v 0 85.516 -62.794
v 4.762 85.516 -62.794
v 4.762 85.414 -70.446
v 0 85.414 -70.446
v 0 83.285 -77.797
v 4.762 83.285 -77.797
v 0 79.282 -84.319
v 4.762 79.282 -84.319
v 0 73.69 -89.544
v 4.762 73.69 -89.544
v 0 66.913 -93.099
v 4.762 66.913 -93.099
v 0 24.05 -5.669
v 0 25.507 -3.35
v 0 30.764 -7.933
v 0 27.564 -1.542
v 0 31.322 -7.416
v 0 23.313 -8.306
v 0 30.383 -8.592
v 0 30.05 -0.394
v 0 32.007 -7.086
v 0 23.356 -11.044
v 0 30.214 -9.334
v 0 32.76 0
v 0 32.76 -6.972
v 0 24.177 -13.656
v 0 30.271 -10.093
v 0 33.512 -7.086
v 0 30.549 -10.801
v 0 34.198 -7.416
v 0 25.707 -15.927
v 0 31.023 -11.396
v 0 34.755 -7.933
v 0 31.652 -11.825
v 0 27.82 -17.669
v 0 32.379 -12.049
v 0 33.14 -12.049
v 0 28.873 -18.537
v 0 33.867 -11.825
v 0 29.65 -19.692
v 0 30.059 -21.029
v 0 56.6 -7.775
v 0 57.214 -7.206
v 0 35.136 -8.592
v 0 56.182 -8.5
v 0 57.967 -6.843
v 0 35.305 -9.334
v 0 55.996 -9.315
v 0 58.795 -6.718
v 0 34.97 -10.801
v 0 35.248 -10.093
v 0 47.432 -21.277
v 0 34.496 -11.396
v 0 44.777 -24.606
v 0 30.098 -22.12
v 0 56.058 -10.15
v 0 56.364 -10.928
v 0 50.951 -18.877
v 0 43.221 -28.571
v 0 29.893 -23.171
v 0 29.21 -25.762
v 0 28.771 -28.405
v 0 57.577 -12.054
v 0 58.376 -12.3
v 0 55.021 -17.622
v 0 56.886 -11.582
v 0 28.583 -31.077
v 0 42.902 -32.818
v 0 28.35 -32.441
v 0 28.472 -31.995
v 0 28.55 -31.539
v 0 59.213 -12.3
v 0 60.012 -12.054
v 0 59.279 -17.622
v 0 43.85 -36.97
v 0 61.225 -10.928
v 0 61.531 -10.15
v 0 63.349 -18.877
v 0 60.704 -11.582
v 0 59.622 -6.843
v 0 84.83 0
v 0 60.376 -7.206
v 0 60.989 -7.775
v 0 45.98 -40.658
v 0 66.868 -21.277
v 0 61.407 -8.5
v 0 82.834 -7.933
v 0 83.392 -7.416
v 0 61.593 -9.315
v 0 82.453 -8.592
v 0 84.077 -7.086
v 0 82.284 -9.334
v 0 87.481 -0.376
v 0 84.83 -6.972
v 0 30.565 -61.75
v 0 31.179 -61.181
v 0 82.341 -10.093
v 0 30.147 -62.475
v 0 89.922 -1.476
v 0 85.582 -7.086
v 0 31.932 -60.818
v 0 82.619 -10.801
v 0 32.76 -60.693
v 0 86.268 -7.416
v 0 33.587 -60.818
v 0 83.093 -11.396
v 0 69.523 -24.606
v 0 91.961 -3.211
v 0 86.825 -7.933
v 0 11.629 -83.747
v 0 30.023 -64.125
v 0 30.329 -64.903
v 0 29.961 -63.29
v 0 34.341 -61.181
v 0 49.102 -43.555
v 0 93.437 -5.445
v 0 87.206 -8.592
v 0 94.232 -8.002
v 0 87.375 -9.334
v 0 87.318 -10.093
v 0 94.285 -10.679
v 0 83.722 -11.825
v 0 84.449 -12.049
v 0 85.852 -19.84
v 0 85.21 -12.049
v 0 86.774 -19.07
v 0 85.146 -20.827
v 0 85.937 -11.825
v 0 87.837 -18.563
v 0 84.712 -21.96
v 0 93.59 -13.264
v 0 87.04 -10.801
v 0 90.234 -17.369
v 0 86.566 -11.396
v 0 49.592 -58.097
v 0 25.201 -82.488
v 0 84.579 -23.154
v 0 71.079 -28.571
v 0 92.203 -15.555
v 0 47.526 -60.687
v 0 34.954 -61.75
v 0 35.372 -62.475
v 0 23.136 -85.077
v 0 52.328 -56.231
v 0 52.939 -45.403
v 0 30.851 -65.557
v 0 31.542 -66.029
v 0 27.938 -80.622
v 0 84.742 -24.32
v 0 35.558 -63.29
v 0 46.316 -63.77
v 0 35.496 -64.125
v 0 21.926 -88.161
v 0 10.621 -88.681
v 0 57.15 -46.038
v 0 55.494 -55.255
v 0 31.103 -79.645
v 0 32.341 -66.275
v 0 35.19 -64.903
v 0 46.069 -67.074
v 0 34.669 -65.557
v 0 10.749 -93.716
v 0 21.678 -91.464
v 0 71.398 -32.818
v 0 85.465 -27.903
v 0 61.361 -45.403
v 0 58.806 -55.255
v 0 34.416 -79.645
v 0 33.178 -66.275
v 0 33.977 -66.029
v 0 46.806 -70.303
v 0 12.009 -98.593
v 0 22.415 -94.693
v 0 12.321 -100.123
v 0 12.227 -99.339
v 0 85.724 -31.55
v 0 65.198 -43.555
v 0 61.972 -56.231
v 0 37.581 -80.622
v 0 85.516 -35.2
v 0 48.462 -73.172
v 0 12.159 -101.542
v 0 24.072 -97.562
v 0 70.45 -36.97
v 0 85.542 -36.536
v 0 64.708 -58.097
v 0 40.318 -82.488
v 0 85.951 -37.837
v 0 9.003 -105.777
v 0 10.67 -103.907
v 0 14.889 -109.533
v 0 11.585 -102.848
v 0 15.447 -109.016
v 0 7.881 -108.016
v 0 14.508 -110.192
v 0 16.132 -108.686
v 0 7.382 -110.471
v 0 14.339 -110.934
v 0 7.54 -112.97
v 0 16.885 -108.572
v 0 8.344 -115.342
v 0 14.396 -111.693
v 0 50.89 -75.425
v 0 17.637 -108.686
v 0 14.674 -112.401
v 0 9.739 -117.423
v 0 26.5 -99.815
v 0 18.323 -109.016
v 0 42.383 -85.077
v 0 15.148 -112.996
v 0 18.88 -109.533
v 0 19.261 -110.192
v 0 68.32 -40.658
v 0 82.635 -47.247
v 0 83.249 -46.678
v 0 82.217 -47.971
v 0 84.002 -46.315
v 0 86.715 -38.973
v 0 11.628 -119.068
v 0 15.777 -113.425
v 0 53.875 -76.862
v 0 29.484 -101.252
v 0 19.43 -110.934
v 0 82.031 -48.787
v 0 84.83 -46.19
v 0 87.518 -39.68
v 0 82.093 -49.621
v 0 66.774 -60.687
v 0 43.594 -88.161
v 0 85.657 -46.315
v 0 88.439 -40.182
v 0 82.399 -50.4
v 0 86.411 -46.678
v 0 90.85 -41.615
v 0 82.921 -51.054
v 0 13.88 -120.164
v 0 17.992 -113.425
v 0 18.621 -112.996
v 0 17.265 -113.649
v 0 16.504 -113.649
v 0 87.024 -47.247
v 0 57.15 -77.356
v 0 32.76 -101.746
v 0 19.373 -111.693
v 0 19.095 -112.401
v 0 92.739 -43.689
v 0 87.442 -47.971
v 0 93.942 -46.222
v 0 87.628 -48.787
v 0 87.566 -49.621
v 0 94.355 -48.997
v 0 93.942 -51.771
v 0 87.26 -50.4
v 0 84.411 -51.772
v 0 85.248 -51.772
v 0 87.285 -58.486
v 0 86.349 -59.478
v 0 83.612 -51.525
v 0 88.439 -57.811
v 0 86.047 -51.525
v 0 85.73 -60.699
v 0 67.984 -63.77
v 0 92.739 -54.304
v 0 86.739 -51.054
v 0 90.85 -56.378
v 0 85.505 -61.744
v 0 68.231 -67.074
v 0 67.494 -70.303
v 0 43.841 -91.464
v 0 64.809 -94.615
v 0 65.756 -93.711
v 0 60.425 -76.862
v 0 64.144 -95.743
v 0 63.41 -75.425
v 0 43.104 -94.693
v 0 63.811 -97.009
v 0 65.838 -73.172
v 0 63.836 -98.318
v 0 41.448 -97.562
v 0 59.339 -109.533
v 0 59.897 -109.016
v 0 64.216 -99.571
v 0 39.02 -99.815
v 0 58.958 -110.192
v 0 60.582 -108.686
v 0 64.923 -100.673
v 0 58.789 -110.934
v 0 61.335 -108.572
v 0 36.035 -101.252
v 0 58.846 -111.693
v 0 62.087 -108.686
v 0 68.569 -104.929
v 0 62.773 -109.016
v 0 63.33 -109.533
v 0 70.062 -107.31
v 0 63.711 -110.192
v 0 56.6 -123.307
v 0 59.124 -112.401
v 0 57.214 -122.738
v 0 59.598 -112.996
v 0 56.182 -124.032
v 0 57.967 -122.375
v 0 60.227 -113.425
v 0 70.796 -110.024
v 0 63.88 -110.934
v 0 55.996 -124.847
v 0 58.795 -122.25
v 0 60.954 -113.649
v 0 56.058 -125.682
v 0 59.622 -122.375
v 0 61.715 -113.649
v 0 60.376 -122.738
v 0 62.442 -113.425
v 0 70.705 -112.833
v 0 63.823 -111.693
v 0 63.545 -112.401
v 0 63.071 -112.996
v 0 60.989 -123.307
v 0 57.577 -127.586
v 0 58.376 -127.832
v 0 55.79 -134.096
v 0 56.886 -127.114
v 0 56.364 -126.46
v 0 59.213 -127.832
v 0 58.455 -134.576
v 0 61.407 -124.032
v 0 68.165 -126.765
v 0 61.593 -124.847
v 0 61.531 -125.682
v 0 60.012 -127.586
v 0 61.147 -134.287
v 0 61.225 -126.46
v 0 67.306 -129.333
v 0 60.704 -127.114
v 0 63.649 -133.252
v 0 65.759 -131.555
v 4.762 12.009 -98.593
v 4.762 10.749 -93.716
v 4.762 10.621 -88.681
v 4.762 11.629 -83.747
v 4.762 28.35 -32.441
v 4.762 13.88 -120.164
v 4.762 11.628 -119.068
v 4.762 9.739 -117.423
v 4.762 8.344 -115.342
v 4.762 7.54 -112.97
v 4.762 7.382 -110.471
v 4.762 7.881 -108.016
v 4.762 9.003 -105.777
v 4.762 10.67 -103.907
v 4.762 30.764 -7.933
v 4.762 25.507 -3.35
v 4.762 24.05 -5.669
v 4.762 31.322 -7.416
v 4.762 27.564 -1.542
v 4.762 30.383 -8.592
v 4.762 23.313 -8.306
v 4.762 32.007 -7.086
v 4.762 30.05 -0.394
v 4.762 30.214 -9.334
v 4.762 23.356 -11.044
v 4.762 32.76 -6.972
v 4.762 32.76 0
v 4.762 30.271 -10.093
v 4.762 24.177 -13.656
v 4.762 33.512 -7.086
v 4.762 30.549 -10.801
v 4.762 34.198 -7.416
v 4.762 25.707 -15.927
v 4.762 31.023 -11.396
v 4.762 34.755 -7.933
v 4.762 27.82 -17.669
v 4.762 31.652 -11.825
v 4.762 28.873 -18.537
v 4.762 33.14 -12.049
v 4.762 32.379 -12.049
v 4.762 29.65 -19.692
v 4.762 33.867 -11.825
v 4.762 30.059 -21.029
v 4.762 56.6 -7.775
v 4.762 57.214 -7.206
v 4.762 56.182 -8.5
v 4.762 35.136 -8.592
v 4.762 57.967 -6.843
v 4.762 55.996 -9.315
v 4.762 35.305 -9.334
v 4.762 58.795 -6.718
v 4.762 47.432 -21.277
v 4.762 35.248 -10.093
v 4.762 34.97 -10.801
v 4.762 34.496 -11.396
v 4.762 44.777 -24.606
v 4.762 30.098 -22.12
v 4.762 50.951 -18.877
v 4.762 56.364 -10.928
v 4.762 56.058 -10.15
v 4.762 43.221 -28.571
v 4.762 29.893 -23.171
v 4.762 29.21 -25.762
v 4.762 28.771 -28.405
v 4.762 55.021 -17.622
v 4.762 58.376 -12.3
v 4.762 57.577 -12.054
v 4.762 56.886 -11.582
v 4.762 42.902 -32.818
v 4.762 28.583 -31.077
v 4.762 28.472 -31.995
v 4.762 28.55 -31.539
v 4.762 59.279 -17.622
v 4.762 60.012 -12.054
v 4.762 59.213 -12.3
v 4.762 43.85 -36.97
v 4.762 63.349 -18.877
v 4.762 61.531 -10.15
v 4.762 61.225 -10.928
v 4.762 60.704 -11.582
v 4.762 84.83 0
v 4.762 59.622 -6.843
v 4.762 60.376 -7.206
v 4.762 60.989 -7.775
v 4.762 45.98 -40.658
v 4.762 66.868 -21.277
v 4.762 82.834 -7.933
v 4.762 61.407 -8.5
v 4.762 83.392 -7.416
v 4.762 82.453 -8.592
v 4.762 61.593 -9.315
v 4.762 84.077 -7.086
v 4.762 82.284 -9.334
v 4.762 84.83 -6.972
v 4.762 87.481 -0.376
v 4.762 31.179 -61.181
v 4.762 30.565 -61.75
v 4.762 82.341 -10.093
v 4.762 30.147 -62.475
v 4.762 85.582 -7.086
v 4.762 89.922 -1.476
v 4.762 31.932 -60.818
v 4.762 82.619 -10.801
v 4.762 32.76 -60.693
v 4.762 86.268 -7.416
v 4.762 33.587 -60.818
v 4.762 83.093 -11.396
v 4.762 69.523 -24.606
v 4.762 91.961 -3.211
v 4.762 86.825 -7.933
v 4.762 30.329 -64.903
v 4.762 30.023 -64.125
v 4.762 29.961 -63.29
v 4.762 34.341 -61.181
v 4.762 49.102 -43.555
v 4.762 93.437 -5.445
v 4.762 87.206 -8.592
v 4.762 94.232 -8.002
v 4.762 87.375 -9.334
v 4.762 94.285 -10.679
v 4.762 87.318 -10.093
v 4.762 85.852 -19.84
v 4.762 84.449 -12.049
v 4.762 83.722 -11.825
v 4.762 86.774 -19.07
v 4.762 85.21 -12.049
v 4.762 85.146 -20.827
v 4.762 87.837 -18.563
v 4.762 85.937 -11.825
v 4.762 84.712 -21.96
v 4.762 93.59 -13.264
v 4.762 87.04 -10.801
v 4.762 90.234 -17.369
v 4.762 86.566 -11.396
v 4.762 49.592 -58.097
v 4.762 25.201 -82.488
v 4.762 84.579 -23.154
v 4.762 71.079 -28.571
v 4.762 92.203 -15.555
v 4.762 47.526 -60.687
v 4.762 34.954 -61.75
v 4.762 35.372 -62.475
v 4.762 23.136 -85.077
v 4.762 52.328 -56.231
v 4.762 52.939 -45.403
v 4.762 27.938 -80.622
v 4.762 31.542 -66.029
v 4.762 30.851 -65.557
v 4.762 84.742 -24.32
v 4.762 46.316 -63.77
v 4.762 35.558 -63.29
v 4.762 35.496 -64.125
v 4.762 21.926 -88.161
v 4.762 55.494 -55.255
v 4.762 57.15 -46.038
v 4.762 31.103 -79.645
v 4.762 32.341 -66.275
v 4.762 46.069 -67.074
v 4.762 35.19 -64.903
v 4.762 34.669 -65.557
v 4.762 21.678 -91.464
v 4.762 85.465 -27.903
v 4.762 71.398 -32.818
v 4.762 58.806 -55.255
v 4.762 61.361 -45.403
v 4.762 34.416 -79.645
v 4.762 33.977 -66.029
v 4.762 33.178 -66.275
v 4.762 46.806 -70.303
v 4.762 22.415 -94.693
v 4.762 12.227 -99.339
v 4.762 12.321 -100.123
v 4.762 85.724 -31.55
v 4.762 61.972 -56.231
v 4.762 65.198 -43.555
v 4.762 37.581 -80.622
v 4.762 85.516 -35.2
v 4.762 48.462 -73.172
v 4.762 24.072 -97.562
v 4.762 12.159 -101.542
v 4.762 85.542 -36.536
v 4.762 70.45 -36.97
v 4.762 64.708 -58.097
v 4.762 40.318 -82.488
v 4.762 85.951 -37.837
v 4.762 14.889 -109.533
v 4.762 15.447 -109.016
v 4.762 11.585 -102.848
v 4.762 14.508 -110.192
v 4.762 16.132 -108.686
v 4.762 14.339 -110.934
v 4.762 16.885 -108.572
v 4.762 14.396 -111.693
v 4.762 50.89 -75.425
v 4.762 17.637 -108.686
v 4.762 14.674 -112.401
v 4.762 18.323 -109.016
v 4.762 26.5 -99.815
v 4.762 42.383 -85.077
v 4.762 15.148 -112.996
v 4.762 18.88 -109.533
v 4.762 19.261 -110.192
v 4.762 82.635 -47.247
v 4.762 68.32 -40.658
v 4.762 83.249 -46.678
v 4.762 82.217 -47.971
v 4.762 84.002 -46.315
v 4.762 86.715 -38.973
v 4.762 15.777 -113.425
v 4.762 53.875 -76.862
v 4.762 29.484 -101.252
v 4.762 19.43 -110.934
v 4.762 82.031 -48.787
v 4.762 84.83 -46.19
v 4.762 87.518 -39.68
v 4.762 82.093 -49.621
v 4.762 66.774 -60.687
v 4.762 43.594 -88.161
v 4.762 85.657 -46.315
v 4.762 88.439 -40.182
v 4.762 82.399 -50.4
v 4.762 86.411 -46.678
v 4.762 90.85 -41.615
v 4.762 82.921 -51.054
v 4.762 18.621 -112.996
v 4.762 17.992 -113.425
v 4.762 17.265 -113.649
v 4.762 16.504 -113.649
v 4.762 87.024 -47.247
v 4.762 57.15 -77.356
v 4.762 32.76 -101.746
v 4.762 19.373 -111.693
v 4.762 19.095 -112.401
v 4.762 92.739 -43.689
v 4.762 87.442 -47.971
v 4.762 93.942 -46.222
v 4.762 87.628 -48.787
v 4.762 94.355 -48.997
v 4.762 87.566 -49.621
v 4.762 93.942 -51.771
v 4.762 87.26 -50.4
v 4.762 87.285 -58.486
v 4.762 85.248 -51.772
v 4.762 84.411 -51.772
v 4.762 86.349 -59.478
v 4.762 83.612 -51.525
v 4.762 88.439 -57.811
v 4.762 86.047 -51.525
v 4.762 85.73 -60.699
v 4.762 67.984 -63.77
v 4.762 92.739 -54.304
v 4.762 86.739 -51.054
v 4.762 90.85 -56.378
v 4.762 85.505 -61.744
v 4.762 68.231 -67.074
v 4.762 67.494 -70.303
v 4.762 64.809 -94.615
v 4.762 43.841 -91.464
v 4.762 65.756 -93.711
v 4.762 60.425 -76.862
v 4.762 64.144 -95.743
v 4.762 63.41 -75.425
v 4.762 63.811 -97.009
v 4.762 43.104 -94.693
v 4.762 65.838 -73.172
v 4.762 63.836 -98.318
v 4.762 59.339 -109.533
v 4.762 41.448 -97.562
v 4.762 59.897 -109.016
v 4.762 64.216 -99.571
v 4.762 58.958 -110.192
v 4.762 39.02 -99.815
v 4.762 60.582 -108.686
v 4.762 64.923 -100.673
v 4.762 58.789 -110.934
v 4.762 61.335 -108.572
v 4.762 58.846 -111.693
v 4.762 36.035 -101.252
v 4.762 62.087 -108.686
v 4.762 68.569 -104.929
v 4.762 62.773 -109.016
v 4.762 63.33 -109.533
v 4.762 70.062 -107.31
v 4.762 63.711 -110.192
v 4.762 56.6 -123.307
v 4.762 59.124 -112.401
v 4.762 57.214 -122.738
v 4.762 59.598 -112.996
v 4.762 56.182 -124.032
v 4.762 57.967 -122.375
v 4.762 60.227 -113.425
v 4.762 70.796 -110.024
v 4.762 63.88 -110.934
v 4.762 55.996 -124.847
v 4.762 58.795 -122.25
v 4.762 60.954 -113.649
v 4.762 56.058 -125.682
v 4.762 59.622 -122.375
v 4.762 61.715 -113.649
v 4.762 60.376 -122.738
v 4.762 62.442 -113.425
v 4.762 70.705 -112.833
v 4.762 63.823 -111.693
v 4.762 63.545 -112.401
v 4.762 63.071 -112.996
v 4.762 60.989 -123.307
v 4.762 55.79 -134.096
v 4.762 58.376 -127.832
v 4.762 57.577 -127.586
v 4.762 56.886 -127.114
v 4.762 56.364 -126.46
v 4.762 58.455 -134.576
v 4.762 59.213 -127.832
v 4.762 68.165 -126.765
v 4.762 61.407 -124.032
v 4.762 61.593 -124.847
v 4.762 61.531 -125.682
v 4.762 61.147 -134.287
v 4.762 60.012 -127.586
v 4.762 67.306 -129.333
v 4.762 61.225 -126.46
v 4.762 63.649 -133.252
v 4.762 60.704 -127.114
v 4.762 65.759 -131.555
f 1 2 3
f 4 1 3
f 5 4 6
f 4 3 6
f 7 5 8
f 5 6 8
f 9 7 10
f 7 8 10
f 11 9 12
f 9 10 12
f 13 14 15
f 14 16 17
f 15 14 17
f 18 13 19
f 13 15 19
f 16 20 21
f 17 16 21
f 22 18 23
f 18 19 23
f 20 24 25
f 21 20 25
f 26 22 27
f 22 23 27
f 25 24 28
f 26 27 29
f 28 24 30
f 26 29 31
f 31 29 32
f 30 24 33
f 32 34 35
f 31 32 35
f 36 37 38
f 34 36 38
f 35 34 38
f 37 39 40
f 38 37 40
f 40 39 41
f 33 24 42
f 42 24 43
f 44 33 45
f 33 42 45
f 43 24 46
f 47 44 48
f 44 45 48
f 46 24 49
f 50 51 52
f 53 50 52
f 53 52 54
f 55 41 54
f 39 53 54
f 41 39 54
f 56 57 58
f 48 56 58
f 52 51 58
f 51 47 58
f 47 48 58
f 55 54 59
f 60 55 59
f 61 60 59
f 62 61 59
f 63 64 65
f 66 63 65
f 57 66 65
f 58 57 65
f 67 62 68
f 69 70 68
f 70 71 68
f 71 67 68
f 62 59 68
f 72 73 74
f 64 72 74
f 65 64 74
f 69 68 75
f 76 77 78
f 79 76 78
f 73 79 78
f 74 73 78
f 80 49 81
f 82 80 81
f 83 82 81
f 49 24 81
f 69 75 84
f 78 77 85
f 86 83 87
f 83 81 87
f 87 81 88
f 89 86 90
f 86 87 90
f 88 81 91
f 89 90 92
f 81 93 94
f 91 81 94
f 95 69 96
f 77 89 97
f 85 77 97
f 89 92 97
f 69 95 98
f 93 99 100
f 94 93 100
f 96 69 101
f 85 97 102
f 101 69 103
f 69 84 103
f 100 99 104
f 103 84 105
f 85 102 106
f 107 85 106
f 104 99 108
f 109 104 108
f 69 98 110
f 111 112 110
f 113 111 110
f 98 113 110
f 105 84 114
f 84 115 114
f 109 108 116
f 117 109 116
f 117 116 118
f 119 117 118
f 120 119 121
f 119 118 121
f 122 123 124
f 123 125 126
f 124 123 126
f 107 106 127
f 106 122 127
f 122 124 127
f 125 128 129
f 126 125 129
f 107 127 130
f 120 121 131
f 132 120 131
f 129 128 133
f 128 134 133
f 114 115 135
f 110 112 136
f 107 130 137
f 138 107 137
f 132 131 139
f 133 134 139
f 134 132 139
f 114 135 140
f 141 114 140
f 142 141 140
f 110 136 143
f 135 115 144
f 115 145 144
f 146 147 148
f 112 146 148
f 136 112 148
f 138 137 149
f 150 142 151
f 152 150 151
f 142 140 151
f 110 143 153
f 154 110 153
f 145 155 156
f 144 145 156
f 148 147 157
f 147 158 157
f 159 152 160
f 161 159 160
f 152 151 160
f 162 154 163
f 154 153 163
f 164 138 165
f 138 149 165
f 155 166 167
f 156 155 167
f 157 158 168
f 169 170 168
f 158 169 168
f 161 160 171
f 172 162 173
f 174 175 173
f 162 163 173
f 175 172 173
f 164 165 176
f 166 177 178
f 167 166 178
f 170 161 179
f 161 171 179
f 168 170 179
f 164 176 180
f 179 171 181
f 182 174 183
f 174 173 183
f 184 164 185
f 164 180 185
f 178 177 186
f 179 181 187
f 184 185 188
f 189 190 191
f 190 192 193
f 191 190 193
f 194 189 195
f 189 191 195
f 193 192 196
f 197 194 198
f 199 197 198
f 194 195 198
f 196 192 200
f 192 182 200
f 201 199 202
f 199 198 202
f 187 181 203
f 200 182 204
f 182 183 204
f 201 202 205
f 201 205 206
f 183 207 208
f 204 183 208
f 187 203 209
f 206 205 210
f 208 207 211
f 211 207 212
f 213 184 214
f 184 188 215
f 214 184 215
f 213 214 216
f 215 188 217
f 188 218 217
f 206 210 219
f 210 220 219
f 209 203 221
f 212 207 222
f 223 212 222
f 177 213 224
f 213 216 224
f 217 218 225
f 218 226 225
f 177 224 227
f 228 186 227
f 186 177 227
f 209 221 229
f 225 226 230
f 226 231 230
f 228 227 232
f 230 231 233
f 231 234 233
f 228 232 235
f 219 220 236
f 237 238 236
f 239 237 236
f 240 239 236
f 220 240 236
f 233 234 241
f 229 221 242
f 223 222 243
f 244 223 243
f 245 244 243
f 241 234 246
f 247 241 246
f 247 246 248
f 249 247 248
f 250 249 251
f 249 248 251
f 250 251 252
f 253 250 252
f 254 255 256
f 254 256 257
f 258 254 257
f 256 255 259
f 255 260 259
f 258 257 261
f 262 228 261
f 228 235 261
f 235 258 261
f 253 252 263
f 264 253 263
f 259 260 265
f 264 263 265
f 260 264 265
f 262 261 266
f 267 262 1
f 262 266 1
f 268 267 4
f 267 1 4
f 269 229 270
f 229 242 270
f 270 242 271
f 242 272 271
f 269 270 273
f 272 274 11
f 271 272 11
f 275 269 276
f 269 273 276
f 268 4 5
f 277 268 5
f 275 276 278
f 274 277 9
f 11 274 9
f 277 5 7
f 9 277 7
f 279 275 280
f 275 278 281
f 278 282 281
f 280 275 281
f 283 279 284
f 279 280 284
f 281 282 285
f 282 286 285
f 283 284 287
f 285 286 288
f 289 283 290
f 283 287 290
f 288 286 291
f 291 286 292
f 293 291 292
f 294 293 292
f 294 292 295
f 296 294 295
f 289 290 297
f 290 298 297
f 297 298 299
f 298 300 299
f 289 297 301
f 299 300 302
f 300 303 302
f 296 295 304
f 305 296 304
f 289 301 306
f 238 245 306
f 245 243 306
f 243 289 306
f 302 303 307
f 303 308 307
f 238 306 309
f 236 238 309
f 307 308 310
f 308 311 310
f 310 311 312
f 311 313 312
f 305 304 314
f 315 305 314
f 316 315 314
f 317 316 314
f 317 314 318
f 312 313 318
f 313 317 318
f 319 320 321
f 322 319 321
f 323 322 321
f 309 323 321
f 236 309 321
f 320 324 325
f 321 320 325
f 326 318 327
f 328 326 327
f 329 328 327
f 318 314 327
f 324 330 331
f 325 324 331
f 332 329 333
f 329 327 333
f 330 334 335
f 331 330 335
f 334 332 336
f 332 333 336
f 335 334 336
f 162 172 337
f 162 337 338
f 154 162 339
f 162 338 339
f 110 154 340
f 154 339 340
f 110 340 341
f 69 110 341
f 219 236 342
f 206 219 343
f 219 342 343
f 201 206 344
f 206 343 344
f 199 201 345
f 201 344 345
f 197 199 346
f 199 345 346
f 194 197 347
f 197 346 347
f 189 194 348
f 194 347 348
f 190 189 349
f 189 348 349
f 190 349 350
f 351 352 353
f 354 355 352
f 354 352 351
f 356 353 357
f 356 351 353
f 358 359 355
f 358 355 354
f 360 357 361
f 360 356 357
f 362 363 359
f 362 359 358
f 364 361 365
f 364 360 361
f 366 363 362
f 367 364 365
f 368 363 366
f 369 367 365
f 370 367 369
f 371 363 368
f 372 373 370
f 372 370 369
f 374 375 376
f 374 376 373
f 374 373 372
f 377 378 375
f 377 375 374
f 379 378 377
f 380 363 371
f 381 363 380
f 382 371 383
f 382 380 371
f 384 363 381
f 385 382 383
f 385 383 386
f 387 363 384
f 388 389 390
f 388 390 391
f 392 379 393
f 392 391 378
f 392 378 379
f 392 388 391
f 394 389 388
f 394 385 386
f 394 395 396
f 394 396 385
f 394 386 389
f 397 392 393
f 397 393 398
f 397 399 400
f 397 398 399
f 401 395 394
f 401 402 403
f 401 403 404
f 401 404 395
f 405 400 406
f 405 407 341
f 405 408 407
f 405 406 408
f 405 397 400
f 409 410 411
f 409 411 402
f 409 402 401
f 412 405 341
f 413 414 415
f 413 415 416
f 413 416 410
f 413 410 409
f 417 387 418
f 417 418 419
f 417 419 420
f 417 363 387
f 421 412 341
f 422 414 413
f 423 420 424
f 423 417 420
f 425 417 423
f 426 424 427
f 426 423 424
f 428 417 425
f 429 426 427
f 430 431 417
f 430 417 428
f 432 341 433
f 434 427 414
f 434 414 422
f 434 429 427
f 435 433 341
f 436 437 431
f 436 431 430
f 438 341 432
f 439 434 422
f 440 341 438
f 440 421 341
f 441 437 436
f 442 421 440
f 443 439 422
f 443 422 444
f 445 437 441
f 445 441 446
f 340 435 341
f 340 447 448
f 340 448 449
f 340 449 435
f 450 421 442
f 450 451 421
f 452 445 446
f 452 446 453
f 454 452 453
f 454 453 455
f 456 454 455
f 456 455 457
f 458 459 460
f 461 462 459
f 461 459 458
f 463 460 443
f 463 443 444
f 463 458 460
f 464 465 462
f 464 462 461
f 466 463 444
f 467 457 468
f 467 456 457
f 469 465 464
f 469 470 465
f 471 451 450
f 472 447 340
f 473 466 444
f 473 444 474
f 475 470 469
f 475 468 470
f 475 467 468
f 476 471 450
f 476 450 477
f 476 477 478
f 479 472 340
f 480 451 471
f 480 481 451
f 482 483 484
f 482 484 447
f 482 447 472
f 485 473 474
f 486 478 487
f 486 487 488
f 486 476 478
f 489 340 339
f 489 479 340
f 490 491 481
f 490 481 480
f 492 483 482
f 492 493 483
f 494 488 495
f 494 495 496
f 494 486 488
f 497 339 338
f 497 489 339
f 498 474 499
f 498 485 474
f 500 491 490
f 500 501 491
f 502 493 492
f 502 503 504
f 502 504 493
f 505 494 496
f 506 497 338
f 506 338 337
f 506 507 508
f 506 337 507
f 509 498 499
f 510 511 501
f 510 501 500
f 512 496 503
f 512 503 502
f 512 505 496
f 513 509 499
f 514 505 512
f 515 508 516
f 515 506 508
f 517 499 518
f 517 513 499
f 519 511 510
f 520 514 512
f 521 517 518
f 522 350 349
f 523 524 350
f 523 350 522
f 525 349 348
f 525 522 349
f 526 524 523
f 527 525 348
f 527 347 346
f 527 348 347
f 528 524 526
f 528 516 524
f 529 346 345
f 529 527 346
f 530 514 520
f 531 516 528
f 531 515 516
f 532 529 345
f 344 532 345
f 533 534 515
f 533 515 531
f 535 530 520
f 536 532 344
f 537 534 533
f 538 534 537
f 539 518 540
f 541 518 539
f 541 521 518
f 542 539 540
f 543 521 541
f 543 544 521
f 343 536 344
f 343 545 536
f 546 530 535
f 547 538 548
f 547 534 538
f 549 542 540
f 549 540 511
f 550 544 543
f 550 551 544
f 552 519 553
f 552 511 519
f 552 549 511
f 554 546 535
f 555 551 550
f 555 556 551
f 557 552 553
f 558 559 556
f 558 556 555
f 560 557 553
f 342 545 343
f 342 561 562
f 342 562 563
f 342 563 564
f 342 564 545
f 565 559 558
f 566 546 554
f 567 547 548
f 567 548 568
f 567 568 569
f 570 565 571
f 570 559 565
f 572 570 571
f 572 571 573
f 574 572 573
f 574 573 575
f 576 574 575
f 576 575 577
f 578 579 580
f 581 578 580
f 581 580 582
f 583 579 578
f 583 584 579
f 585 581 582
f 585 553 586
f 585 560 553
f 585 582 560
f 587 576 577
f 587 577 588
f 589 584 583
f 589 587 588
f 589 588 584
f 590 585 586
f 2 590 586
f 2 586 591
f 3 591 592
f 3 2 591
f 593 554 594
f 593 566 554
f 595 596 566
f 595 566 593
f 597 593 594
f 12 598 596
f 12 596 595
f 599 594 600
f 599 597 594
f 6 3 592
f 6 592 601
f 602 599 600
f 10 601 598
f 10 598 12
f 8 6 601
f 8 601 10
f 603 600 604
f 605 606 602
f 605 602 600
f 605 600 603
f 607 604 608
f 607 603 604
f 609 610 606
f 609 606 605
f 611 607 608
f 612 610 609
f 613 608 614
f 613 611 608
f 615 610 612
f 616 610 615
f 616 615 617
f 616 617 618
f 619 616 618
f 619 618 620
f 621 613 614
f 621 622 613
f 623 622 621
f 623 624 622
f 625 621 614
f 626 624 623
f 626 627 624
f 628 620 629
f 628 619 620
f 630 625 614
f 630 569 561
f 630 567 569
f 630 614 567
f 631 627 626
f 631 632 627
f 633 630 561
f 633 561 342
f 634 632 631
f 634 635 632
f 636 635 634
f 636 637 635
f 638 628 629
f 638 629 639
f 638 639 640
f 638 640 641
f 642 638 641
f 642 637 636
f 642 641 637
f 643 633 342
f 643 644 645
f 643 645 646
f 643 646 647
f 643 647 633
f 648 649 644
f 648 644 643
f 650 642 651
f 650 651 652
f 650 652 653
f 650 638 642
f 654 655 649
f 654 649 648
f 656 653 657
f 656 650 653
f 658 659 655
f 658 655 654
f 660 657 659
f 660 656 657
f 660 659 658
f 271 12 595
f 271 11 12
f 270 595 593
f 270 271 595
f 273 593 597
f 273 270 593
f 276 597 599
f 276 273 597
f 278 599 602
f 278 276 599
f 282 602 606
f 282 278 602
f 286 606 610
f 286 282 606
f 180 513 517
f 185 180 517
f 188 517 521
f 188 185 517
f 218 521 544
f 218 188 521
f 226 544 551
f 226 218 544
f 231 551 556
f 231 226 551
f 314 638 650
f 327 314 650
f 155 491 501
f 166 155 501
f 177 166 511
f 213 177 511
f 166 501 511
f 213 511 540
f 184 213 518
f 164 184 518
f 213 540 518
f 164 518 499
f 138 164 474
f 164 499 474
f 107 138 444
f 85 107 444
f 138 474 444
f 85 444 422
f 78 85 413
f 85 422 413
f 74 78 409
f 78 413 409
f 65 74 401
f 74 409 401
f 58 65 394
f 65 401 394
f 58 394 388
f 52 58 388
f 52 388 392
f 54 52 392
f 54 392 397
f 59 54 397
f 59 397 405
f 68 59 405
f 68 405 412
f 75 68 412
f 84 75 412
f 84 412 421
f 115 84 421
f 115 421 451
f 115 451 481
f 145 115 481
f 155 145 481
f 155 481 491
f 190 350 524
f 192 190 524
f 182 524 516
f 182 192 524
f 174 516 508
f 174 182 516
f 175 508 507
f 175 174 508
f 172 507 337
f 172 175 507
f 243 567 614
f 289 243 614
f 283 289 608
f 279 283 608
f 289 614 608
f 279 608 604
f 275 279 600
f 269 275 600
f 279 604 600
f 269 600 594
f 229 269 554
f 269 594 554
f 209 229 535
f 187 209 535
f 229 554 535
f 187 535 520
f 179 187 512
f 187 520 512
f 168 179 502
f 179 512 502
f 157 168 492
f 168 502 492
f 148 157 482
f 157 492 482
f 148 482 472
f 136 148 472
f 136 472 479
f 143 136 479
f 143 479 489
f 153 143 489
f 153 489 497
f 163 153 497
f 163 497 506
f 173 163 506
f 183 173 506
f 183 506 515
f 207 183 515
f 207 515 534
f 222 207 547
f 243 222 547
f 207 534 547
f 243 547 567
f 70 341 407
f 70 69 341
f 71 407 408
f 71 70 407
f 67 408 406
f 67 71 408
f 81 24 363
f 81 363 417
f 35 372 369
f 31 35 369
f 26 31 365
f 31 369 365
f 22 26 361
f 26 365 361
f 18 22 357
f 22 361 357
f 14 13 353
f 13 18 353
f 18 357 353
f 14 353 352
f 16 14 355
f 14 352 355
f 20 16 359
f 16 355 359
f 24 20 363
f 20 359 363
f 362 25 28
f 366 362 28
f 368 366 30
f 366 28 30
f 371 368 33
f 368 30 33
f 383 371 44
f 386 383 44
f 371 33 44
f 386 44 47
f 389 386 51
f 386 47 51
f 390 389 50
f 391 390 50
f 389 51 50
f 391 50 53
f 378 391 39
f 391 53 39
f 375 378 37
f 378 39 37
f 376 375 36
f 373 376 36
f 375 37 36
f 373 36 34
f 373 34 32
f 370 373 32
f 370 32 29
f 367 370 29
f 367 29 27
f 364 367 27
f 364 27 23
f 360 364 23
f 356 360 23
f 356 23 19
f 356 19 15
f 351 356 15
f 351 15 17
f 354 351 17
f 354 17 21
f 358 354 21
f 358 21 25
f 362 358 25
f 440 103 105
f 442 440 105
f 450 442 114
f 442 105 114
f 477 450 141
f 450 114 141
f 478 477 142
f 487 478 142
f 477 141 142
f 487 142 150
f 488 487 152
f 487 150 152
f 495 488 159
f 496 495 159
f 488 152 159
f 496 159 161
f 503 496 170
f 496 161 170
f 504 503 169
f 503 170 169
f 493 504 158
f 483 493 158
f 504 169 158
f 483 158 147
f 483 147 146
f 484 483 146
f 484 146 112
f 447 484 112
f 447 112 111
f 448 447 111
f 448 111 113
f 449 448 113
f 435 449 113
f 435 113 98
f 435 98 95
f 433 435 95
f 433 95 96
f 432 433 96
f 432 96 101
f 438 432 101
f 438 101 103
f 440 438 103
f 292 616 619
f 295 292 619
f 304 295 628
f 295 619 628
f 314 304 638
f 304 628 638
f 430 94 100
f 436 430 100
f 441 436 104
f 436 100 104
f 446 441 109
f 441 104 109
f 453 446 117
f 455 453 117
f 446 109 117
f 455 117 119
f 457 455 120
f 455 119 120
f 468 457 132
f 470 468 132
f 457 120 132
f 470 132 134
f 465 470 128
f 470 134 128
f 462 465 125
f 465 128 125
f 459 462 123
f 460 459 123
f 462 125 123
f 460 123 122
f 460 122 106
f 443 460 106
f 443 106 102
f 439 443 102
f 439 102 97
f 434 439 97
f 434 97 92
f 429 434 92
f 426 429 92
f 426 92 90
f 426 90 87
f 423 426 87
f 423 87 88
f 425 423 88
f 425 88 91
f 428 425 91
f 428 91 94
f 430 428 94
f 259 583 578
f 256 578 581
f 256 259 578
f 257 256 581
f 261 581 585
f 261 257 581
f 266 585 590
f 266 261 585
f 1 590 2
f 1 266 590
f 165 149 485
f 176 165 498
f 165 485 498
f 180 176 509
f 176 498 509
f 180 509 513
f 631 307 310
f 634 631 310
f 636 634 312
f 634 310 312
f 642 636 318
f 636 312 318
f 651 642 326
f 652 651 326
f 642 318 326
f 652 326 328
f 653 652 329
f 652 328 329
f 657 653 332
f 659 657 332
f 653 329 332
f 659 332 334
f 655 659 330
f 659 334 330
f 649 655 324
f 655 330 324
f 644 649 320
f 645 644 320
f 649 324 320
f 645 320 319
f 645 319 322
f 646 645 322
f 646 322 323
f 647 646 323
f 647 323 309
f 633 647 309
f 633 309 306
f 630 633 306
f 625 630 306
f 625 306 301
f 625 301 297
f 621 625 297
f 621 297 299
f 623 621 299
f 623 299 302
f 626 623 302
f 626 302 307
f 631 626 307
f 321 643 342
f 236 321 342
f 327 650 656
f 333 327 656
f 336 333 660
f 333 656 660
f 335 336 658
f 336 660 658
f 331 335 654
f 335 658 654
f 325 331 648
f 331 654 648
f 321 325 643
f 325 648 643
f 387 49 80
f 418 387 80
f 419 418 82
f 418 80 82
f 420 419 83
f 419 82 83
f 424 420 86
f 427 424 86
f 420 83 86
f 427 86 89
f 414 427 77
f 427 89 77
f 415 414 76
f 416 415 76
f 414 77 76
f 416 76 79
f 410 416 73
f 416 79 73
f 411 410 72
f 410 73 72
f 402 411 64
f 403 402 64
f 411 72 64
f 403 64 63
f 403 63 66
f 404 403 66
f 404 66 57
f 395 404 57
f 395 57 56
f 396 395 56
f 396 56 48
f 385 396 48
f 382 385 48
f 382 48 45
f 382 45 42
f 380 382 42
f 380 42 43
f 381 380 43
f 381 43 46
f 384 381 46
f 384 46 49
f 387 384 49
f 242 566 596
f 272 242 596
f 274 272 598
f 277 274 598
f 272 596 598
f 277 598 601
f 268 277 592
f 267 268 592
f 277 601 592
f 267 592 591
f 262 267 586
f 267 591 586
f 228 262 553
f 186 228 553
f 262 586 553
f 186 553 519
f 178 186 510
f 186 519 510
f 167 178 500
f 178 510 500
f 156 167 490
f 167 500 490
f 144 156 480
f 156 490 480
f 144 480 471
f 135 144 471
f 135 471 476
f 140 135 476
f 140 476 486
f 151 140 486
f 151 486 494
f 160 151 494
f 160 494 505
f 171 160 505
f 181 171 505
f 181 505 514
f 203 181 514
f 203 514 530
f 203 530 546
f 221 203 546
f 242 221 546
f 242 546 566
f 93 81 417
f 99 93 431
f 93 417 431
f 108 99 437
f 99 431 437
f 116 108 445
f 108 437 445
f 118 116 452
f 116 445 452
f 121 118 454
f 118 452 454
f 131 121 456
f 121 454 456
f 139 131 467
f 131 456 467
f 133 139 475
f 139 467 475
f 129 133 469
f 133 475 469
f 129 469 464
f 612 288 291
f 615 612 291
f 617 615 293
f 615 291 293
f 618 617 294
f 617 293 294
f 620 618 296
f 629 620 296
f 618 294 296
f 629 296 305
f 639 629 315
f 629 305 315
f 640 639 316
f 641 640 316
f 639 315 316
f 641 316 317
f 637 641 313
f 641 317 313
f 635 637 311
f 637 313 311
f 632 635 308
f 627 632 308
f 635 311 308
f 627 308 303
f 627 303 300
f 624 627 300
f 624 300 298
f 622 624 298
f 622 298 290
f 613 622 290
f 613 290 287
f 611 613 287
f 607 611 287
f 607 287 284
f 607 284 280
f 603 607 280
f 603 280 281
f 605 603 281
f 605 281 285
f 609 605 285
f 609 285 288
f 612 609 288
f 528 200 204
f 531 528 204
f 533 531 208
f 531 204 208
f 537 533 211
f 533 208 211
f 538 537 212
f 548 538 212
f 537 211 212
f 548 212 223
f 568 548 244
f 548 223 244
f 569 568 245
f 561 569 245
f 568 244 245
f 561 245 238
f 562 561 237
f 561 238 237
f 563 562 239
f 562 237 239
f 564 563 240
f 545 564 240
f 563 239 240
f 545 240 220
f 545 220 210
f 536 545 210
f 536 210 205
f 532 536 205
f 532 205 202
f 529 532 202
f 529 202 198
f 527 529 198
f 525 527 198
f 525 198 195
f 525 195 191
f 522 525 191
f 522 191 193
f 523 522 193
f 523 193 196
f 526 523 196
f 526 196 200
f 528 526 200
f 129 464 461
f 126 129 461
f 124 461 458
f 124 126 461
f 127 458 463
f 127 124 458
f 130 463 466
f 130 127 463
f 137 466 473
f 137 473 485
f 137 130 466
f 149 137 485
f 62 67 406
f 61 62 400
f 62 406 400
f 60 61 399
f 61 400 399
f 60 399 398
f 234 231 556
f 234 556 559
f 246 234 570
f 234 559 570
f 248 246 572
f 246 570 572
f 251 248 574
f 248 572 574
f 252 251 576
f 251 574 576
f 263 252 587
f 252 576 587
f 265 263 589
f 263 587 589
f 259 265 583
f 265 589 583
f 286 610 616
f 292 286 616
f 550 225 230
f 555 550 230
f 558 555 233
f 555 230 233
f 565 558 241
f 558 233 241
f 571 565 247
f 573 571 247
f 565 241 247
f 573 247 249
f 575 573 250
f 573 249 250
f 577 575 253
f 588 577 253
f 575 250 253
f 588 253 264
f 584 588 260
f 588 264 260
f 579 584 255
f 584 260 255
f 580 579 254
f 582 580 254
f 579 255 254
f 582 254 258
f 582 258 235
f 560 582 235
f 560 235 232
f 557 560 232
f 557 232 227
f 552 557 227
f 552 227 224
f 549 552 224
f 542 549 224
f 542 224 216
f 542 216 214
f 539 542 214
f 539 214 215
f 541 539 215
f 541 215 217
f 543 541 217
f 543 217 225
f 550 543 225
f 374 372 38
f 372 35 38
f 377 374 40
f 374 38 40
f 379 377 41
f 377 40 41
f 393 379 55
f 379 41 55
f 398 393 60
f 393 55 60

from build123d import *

# Parameters (mm, degrees)
SKETCH1_W              = 146.05
SKETCH1_H              = 101.6
BOSS_EXTRUDE2_DEPTH    = 4.7625
SKETCH2_R              = 11.1125
SKETCH2_R_2            = 14.2875
CUT_EXTRUDE1_DEPTH     = 5.7625
F_10_CLEARANCE_HOLE1_D = 5.1054
F_10_CLEARANCE_HOLE2_D = 5.6134
CUT_EXTRUDE2_DEPTH     = 5.7625
FILLET1_R              = 4.7625
SKETCH8_R              = 14.2875
CUT_EXTRUDE3_DEPTH     = 5.7625001
SKETCH9_R              = 14.2875
SKETCH9_R_2            = 11.1125
BOSS_EXTRUDE3_DEPTH    = 4.7625


with BuildPart() as part:
    # Sketch1 → Boss-Extrude2 (new body)
    with BuildSketch(Plane(origin=(0, 0, 0), x_dir=(0, 0, -1), z_dir=(1, 0, 0))):
        with Locations((73.025, 50.8)):
            Rectangle(SKETCH1_W, SKETCH1_H)
    extrude(amount=BOSS_EXTRUDE2_DEPTH)

    # Sketch2 → Cut-Extrude1 (cut, through all)
    with BuildSketch(Plane(origin=(4.7625, 0, 0), x_dir=(0, 0, -1), z_dir=(1, 0, 0))):
        with Locations((66.2432, 57.15)):
            Circle(SKETCH2_R)
        with Locations((31.75, 57.15)):
            Circle(SKETCH2_R)
        with Locations((90.633575625, 32.759624375)):
            Circle(SKETCH2_R_2)
    extrude(amount=-CUT_EXTRUDE1_DEPTH, mode=Mode.SUBTRACT)

    # #10 Clearance Hole1 (through all)
    with Locations(Plane(origin=(4.7625, 0, 0), x_dir=(0, 0, -1), z_dir=(1, 0, 0))):
        with Locations((9.525, 84.829624375), (111.125, 61.334624375), (9.525, 32.759624375), (111.125, 16.884624375)):
            Hole(F_10_CLEARANCE_HOLE1_D / 2)

    # #10 Clearance Hole2 (through all)
    with Locations(Plane(origin=(4.7625, 0, 0), x_dir=(0, 0, -1), z_dir=(1, 0, 0))):
        with Locations((9.525, 58.794624375), (48.9966, 84.829624375), (125.056959494, 58.794624375), (63.5, 32.759624375)):
            Hole(F_10_CLEARANCE_HOLE2_D / 2)

    # Sketch7 → Cut-Extrude2 (cut, through all)
    with BuildSketch(Plane(origin=(4.7625, 0, 0), x_dir=(0, 0, -1), z_dir=(1, 0, 0))):
        with BuildLine():
            ThreePointArc((58.52011675, 84.661535946), (82.426770011, 80.700428589), (94.694801926, 59.802729323))
            Line((94.694801926, 59.802729323), (104.928643901, 68.568627146))
            ThreePointArc((104.928643901, 68.568627146), (108.639710016, 70.529675147), (112.8333867, 70.705165442))
            Line((112.8333867, 70.705165442), (126.765346195, 68.165165442))
            ThreePointArc((126.765346195, 68.165165442), (133.252161891, 63.648929957), (134.095626133, 55.789939634))
            Line((134.095626133, 55.789939634), (120.163666639, 13.879939634))
            ThreePointArc((120.163666639, 13.879939634), (111.198276093, 7.359906237), (102.133632107, 13.741229966))
            ThreePointArc((102.133632107, 13.741229966), (93.170530223, 10.67989416), (83.746678665, 11.628574348))
            Line((83.746678665, 11.628574348), (31.75, 28.575))
            ThreePointArc((31.75, 28.575), (25.188529488, 29.338532406), (18.97770782, 31.588326004))
            ThreePointArc((18.97770782, 31.588326004), (8.938236412, 23.252714599), (0, 32.759624375))
            Line((0, 32.759624375), (0, 0))
            Line((0, 0), (146.05, 0))
            Line((146.05, 0), (146.05, 101.6))
            Line((146.05, 101.6), (0, 101.6))
            Line((0, 101.6), (0, 84.829624375))
            ThreePointArc((0, 84.829624375), (10.639110316, 94.28924293), (18.789371801, 82.616698681))
            ThreePointArc((18.789371801, 82.616698681), (28.938717529, 85.586373114), (39.47308325, 84.661535946))
            ThreePointArc((39.47308325, 84.661535946), (48.9966, 94.354624375), (58.52011675, 84.661535946))
        make_face()
    extrude(amount=-CUT_EXTRUDE2_DEPTH, mode=Mode.SUBTRACT)

    # Fillet1
    fillet1_edges = [part.edges().sort_by_distance(p)[0] for p in [
        (2.38125, 59.802729323, -94.694801926),
        (2.38125, 84.661535946, -58.52011675),
        (2.38125, 84.661535946, -39.47308325),
        (2.38125, 82.616698681, -18.789371801),
        (2.38125, 31.588326004, -18.97770782),
        (2.38125, 28.575, -31.75),
        (2.38125, 13.741229966, -102.133632107),
    ]]
    fillet(fillet1_edges, radius=FILLET1_R)

    # Sketch8 → Cut-Extrude3 (cut, through all)
    with BuildSketch(Plane(origin=(4.7625, 0, 0), x_dir=(0, 0, -1), z_dir=(1, 0, 0))):
        with Locations((31.75, 57.15)):
            Circle(SKETCH8_R)
    extrude(amount=-CUT_EXTRUDE3_DEPTH, mode=Mode.SUBTRACT)

    # Sketch9 → Boss-Extrude3 (add)
    with BuildSketch(Plane(origin=(4.7625, 0, 0), x_dir=(0, 0, -1), z_dir=(1, 0, 0))):
        with Locations((90.633575625, 32.759624375)):
            Circle(SKETCH9_R)
        with Locations((90.633575625, 32.759624375)):
            Circle(SKETCH9_R_2, mode=Mode.SUBTRACT)
    extrude(amount=-BOSS_EXTRUDE3_DEPTH)


solid = part.part
